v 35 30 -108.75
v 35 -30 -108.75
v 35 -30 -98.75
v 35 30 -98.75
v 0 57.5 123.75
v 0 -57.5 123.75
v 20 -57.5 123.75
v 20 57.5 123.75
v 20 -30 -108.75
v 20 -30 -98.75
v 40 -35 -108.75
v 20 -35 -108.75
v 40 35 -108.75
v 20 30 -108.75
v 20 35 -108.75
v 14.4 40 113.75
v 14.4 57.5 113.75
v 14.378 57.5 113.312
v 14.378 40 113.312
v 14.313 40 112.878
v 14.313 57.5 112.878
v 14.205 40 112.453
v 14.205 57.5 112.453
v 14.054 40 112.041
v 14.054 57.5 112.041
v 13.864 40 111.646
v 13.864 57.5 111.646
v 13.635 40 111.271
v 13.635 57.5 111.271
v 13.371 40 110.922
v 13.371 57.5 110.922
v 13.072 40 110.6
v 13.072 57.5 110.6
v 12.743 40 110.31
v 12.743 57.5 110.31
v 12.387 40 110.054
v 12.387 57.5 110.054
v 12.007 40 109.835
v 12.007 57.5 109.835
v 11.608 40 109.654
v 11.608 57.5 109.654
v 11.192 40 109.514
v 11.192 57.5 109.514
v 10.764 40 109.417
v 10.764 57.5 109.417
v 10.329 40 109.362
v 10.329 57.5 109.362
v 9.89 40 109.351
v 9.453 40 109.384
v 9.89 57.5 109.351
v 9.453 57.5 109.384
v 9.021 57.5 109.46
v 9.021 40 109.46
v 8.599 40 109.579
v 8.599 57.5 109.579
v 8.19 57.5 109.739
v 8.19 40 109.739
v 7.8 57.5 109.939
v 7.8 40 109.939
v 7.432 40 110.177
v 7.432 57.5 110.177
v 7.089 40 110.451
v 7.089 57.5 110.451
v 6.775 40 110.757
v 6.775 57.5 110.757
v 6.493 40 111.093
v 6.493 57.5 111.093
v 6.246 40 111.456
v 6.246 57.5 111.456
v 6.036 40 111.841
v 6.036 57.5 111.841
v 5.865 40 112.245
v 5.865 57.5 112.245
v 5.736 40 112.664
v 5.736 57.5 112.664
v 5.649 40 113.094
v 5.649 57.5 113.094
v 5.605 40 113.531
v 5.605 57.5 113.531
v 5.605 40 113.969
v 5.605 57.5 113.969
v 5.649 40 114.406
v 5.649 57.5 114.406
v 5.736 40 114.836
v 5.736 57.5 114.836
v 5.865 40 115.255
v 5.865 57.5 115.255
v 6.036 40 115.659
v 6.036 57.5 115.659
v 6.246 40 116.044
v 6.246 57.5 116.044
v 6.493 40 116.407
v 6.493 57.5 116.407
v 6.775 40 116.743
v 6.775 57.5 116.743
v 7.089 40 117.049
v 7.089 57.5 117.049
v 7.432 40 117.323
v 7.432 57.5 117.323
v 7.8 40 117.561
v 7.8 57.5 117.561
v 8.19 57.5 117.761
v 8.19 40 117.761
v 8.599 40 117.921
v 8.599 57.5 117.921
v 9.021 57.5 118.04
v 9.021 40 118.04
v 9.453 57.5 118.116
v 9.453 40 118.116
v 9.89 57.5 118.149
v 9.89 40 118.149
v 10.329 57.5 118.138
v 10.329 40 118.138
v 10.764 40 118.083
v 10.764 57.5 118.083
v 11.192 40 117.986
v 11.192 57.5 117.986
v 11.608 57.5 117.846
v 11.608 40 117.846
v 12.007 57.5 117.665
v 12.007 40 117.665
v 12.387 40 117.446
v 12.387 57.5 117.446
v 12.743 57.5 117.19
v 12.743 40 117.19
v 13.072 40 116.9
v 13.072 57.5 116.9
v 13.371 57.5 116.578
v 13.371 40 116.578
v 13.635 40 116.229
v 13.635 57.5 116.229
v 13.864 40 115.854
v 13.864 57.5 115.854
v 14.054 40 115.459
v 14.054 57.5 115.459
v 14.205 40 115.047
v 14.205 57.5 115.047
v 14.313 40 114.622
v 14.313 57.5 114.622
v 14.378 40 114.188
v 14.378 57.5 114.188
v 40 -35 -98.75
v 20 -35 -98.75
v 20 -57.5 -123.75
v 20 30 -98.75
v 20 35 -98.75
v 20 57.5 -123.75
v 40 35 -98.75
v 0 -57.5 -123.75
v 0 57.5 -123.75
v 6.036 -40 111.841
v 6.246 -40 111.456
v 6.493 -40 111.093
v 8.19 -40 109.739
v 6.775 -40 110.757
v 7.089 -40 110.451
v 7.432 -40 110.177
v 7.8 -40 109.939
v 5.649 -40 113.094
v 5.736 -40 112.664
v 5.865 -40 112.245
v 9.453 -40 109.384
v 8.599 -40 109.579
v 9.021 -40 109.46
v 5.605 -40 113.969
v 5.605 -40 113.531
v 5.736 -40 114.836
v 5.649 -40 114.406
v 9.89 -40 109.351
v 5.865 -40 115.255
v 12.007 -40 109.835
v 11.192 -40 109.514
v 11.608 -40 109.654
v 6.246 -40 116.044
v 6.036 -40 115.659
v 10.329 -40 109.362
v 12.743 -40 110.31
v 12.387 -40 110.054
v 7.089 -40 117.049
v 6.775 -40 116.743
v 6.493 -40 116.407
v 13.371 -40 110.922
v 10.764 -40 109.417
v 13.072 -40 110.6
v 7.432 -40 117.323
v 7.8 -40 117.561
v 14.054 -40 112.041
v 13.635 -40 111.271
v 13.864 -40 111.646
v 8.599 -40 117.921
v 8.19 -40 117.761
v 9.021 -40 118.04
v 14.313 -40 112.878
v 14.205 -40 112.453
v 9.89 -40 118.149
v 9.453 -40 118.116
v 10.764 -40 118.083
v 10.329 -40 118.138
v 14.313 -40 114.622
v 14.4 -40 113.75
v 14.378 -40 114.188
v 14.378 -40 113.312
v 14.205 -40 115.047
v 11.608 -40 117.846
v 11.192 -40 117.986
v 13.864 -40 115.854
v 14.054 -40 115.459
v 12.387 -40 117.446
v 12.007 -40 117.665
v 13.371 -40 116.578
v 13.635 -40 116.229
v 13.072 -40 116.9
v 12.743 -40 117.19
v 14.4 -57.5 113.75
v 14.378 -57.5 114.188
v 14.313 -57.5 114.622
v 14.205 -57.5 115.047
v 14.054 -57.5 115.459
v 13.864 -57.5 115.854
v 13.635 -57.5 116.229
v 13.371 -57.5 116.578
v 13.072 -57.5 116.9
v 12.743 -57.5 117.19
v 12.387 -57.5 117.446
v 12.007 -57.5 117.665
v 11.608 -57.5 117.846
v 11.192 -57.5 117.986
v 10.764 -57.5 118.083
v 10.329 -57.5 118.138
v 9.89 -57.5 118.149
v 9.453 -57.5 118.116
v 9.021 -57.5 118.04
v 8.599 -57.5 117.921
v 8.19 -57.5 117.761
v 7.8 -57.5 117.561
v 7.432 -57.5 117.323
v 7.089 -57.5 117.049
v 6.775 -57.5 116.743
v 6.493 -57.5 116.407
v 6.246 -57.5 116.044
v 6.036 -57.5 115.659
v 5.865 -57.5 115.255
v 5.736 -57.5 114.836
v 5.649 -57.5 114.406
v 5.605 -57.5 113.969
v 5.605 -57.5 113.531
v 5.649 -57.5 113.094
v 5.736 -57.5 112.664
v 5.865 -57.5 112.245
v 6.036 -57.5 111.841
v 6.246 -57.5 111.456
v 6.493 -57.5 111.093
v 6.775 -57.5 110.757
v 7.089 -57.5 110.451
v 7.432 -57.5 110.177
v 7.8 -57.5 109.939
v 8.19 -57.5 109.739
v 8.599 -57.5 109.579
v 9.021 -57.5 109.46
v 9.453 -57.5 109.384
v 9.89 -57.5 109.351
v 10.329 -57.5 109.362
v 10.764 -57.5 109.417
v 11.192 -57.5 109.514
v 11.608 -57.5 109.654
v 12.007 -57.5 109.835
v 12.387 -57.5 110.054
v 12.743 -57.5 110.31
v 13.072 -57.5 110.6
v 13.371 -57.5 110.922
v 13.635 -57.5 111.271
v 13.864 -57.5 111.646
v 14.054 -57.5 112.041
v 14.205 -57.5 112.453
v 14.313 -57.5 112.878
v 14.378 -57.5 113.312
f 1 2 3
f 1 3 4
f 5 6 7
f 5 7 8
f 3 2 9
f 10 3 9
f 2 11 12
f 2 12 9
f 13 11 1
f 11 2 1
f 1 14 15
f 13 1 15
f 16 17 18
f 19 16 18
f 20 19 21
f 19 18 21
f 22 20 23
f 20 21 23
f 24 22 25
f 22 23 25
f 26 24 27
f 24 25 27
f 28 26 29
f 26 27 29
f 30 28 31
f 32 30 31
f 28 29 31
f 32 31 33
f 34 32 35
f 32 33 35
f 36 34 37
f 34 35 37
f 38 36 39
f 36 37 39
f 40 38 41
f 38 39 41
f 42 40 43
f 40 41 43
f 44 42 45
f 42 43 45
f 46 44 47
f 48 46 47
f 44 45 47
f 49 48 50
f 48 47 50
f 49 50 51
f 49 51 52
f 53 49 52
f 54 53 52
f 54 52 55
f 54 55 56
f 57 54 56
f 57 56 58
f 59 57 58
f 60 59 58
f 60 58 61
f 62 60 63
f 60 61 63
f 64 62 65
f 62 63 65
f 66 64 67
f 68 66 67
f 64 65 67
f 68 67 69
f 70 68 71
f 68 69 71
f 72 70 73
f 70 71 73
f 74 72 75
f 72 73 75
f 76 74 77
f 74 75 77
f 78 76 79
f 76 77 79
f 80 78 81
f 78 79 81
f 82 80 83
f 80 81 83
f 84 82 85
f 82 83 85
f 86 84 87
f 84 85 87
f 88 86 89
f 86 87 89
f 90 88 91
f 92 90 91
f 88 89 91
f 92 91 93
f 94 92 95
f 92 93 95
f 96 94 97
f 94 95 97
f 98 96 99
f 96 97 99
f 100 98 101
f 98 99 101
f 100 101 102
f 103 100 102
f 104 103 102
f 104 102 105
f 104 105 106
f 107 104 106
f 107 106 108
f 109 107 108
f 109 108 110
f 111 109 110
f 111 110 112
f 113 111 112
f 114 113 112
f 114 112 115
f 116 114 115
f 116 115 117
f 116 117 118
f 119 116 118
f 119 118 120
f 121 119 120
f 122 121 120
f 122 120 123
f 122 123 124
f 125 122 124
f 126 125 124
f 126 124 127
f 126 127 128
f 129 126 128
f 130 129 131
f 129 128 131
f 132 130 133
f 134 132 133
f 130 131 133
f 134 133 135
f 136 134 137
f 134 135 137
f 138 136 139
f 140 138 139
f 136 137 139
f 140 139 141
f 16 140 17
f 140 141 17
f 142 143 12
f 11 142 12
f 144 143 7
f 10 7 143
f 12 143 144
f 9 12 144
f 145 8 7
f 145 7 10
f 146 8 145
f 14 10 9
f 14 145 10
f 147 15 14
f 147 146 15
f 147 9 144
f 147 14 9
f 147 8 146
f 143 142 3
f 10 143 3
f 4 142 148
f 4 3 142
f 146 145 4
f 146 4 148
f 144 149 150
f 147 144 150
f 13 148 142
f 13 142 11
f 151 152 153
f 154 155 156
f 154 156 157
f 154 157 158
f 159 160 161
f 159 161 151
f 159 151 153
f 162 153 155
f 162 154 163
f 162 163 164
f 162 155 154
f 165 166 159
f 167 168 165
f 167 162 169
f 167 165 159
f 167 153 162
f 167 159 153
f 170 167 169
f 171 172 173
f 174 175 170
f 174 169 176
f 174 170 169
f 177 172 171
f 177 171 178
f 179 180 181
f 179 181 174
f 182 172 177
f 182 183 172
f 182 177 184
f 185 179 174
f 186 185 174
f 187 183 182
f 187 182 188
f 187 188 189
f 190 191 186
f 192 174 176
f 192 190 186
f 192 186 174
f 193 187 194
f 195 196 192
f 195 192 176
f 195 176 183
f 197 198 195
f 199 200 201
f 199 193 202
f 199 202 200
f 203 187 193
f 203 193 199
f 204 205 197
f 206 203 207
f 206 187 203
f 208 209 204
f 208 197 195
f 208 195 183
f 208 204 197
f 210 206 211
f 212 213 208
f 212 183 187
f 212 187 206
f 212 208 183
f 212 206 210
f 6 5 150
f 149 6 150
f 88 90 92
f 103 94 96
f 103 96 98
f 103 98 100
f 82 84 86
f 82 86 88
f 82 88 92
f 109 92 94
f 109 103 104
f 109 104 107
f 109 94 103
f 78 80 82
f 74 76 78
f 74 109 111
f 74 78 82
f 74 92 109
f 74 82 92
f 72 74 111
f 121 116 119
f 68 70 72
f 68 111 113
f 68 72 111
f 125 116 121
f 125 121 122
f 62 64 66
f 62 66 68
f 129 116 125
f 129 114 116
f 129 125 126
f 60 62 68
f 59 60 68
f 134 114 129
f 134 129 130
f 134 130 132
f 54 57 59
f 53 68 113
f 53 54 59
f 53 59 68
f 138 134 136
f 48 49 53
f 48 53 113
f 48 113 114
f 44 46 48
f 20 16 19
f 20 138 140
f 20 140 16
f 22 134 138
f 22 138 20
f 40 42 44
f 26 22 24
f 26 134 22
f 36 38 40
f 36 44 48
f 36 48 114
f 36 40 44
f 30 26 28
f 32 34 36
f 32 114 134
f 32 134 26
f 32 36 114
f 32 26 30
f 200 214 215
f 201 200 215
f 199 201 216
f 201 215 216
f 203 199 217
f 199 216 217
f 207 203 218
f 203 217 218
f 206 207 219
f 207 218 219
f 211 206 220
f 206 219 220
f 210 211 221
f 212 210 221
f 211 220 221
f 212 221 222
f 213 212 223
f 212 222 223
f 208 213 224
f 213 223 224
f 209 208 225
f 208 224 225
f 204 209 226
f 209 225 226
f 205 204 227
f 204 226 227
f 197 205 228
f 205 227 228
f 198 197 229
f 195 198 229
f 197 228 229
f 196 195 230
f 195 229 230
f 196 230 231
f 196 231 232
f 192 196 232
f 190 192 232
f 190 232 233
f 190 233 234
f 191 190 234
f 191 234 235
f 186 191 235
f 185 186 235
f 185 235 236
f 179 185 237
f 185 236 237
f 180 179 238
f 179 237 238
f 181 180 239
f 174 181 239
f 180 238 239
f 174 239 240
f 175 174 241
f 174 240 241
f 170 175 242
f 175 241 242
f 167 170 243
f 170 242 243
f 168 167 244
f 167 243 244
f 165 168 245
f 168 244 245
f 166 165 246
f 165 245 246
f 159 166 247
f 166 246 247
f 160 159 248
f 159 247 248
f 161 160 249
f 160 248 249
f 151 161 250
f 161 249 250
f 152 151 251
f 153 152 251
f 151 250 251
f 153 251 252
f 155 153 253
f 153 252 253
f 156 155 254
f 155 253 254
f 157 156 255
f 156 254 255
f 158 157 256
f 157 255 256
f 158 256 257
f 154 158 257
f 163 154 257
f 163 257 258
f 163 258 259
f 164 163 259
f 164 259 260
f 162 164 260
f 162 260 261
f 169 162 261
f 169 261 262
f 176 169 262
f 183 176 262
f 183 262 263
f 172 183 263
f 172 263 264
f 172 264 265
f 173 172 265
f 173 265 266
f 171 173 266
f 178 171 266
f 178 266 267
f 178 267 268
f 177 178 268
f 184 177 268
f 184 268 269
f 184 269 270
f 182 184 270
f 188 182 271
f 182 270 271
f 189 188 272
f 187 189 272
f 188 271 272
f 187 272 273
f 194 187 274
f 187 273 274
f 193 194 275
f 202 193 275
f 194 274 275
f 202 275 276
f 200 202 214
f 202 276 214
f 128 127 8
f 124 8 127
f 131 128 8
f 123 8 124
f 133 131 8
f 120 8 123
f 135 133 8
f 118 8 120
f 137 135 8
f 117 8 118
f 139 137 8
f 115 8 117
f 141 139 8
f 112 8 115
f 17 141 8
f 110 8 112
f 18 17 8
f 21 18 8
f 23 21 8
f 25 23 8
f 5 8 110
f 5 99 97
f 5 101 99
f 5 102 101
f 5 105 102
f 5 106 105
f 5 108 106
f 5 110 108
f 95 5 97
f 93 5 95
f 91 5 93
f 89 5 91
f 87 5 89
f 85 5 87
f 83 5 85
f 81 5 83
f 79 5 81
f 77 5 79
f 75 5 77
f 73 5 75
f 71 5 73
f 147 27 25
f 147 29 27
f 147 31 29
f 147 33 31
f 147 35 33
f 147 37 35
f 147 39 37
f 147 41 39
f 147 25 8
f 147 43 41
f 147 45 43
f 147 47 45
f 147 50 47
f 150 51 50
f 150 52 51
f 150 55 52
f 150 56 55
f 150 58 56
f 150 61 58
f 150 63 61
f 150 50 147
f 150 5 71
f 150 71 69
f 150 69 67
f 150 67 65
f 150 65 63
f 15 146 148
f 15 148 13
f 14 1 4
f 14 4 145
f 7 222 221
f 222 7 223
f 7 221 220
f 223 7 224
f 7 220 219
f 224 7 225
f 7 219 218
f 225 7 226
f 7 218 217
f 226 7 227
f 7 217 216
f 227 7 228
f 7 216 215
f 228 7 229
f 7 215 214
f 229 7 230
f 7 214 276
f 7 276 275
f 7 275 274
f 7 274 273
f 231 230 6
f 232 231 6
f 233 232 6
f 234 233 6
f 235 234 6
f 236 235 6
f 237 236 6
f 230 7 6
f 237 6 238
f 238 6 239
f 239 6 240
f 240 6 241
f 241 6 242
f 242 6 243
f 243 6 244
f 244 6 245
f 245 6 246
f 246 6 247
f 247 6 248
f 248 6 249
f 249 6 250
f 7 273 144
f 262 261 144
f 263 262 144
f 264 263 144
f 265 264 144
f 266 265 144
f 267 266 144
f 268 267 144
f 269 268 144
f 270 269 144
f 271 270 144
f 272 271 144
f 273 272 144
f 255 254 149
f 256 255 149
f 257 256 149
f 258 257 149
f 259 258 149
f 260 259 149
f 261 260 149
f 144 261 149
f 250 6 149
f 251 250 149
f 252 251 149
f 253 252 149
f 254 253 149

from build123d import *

# Parameters (mm, degrees)
SKETCH1_W           = 247.5
SKETCH1_H           = 115
BOSS_EXTRUDE1_DEPTH = 20
SKETCH2_R           = 4.4
CUT_EXTRUDE1_DEPTH  = 17.5
SKETCH3_R           = 4.4
CUT_EXTRUDE2_DEPTH  = 17.5
SKETCH6_W           = 10
SKETCH6_H           = 70
BOSS_EXTRUDE3_DEPTH = 20
SKETCH7_W           = 15
SKETCH7_H           = 60
CUT_EXTRUDE4_DEPTH  = 20


with BuildPart() as part:
    # Sketch1 → Boss-Extrude1 (new body)
    with BuildSketch(Plane(origin=(0, 0, 0), x_dir=(0, 0, -1), z_dir=(1, 0, 0))):
        Rectangle(SKETCH1_W, SKETCH1_H)
    extrude(amount=BOSS_EXTRUDE1_DEPTH)

    # Sketch2 → Cut-Extrude1 (cut)
    with BuildSketch(Plane(origin=(0, 57.5, 0), x_dir=(1, 0, 0), z_dir=(0, 1, 0))):
        with Locations((10, -113.75)):
            Circle(SKETCH2_R)
    extrude(amount=-CUT_EXTRUDE1_DEPTH, mode=Mode.SUBTRACT)

    # Sketch3 → Cut-Extrude2 (cut)
    with BuildSketch(Plane.XZ.offset(57.5)):
        with Locations((10, 113.75)):
            Circle(SKETCH3_R)
    extrude(amount=-CUT_EXTRUDE2_DEPTH, mode=Mode.SUBTRACT)

    # Sketch6 → Boss-Extrude3 (add)
    with BuildSketch(Plane(origin=(20, 0, 0), x_dir=(0, 0, -1), z_dir=(1, 0, 0))):
        with Locations((103.75, 0)):
            Rectangle(SKETCH6_W, SKETCH6_H)
    extrude(amount=BOSS_EXTRUDE3_DEPTH)

    # Sketch7 → Cut-Extrude4 (cut)
    with BuildSketch(Plane(origin=(0, 0, -108.75), x_dir=(-1, 0, 0), z_dir=(0, 0, -1))):
        with Locations((-27.5, 0)):
            Rectangle(SKETCH7_W, SKETCH7_H)
    extrude(amount=-CUT_EXTRUDE4_DEPTH, mode=Mode.SUBTRACT)


solid = part.part
